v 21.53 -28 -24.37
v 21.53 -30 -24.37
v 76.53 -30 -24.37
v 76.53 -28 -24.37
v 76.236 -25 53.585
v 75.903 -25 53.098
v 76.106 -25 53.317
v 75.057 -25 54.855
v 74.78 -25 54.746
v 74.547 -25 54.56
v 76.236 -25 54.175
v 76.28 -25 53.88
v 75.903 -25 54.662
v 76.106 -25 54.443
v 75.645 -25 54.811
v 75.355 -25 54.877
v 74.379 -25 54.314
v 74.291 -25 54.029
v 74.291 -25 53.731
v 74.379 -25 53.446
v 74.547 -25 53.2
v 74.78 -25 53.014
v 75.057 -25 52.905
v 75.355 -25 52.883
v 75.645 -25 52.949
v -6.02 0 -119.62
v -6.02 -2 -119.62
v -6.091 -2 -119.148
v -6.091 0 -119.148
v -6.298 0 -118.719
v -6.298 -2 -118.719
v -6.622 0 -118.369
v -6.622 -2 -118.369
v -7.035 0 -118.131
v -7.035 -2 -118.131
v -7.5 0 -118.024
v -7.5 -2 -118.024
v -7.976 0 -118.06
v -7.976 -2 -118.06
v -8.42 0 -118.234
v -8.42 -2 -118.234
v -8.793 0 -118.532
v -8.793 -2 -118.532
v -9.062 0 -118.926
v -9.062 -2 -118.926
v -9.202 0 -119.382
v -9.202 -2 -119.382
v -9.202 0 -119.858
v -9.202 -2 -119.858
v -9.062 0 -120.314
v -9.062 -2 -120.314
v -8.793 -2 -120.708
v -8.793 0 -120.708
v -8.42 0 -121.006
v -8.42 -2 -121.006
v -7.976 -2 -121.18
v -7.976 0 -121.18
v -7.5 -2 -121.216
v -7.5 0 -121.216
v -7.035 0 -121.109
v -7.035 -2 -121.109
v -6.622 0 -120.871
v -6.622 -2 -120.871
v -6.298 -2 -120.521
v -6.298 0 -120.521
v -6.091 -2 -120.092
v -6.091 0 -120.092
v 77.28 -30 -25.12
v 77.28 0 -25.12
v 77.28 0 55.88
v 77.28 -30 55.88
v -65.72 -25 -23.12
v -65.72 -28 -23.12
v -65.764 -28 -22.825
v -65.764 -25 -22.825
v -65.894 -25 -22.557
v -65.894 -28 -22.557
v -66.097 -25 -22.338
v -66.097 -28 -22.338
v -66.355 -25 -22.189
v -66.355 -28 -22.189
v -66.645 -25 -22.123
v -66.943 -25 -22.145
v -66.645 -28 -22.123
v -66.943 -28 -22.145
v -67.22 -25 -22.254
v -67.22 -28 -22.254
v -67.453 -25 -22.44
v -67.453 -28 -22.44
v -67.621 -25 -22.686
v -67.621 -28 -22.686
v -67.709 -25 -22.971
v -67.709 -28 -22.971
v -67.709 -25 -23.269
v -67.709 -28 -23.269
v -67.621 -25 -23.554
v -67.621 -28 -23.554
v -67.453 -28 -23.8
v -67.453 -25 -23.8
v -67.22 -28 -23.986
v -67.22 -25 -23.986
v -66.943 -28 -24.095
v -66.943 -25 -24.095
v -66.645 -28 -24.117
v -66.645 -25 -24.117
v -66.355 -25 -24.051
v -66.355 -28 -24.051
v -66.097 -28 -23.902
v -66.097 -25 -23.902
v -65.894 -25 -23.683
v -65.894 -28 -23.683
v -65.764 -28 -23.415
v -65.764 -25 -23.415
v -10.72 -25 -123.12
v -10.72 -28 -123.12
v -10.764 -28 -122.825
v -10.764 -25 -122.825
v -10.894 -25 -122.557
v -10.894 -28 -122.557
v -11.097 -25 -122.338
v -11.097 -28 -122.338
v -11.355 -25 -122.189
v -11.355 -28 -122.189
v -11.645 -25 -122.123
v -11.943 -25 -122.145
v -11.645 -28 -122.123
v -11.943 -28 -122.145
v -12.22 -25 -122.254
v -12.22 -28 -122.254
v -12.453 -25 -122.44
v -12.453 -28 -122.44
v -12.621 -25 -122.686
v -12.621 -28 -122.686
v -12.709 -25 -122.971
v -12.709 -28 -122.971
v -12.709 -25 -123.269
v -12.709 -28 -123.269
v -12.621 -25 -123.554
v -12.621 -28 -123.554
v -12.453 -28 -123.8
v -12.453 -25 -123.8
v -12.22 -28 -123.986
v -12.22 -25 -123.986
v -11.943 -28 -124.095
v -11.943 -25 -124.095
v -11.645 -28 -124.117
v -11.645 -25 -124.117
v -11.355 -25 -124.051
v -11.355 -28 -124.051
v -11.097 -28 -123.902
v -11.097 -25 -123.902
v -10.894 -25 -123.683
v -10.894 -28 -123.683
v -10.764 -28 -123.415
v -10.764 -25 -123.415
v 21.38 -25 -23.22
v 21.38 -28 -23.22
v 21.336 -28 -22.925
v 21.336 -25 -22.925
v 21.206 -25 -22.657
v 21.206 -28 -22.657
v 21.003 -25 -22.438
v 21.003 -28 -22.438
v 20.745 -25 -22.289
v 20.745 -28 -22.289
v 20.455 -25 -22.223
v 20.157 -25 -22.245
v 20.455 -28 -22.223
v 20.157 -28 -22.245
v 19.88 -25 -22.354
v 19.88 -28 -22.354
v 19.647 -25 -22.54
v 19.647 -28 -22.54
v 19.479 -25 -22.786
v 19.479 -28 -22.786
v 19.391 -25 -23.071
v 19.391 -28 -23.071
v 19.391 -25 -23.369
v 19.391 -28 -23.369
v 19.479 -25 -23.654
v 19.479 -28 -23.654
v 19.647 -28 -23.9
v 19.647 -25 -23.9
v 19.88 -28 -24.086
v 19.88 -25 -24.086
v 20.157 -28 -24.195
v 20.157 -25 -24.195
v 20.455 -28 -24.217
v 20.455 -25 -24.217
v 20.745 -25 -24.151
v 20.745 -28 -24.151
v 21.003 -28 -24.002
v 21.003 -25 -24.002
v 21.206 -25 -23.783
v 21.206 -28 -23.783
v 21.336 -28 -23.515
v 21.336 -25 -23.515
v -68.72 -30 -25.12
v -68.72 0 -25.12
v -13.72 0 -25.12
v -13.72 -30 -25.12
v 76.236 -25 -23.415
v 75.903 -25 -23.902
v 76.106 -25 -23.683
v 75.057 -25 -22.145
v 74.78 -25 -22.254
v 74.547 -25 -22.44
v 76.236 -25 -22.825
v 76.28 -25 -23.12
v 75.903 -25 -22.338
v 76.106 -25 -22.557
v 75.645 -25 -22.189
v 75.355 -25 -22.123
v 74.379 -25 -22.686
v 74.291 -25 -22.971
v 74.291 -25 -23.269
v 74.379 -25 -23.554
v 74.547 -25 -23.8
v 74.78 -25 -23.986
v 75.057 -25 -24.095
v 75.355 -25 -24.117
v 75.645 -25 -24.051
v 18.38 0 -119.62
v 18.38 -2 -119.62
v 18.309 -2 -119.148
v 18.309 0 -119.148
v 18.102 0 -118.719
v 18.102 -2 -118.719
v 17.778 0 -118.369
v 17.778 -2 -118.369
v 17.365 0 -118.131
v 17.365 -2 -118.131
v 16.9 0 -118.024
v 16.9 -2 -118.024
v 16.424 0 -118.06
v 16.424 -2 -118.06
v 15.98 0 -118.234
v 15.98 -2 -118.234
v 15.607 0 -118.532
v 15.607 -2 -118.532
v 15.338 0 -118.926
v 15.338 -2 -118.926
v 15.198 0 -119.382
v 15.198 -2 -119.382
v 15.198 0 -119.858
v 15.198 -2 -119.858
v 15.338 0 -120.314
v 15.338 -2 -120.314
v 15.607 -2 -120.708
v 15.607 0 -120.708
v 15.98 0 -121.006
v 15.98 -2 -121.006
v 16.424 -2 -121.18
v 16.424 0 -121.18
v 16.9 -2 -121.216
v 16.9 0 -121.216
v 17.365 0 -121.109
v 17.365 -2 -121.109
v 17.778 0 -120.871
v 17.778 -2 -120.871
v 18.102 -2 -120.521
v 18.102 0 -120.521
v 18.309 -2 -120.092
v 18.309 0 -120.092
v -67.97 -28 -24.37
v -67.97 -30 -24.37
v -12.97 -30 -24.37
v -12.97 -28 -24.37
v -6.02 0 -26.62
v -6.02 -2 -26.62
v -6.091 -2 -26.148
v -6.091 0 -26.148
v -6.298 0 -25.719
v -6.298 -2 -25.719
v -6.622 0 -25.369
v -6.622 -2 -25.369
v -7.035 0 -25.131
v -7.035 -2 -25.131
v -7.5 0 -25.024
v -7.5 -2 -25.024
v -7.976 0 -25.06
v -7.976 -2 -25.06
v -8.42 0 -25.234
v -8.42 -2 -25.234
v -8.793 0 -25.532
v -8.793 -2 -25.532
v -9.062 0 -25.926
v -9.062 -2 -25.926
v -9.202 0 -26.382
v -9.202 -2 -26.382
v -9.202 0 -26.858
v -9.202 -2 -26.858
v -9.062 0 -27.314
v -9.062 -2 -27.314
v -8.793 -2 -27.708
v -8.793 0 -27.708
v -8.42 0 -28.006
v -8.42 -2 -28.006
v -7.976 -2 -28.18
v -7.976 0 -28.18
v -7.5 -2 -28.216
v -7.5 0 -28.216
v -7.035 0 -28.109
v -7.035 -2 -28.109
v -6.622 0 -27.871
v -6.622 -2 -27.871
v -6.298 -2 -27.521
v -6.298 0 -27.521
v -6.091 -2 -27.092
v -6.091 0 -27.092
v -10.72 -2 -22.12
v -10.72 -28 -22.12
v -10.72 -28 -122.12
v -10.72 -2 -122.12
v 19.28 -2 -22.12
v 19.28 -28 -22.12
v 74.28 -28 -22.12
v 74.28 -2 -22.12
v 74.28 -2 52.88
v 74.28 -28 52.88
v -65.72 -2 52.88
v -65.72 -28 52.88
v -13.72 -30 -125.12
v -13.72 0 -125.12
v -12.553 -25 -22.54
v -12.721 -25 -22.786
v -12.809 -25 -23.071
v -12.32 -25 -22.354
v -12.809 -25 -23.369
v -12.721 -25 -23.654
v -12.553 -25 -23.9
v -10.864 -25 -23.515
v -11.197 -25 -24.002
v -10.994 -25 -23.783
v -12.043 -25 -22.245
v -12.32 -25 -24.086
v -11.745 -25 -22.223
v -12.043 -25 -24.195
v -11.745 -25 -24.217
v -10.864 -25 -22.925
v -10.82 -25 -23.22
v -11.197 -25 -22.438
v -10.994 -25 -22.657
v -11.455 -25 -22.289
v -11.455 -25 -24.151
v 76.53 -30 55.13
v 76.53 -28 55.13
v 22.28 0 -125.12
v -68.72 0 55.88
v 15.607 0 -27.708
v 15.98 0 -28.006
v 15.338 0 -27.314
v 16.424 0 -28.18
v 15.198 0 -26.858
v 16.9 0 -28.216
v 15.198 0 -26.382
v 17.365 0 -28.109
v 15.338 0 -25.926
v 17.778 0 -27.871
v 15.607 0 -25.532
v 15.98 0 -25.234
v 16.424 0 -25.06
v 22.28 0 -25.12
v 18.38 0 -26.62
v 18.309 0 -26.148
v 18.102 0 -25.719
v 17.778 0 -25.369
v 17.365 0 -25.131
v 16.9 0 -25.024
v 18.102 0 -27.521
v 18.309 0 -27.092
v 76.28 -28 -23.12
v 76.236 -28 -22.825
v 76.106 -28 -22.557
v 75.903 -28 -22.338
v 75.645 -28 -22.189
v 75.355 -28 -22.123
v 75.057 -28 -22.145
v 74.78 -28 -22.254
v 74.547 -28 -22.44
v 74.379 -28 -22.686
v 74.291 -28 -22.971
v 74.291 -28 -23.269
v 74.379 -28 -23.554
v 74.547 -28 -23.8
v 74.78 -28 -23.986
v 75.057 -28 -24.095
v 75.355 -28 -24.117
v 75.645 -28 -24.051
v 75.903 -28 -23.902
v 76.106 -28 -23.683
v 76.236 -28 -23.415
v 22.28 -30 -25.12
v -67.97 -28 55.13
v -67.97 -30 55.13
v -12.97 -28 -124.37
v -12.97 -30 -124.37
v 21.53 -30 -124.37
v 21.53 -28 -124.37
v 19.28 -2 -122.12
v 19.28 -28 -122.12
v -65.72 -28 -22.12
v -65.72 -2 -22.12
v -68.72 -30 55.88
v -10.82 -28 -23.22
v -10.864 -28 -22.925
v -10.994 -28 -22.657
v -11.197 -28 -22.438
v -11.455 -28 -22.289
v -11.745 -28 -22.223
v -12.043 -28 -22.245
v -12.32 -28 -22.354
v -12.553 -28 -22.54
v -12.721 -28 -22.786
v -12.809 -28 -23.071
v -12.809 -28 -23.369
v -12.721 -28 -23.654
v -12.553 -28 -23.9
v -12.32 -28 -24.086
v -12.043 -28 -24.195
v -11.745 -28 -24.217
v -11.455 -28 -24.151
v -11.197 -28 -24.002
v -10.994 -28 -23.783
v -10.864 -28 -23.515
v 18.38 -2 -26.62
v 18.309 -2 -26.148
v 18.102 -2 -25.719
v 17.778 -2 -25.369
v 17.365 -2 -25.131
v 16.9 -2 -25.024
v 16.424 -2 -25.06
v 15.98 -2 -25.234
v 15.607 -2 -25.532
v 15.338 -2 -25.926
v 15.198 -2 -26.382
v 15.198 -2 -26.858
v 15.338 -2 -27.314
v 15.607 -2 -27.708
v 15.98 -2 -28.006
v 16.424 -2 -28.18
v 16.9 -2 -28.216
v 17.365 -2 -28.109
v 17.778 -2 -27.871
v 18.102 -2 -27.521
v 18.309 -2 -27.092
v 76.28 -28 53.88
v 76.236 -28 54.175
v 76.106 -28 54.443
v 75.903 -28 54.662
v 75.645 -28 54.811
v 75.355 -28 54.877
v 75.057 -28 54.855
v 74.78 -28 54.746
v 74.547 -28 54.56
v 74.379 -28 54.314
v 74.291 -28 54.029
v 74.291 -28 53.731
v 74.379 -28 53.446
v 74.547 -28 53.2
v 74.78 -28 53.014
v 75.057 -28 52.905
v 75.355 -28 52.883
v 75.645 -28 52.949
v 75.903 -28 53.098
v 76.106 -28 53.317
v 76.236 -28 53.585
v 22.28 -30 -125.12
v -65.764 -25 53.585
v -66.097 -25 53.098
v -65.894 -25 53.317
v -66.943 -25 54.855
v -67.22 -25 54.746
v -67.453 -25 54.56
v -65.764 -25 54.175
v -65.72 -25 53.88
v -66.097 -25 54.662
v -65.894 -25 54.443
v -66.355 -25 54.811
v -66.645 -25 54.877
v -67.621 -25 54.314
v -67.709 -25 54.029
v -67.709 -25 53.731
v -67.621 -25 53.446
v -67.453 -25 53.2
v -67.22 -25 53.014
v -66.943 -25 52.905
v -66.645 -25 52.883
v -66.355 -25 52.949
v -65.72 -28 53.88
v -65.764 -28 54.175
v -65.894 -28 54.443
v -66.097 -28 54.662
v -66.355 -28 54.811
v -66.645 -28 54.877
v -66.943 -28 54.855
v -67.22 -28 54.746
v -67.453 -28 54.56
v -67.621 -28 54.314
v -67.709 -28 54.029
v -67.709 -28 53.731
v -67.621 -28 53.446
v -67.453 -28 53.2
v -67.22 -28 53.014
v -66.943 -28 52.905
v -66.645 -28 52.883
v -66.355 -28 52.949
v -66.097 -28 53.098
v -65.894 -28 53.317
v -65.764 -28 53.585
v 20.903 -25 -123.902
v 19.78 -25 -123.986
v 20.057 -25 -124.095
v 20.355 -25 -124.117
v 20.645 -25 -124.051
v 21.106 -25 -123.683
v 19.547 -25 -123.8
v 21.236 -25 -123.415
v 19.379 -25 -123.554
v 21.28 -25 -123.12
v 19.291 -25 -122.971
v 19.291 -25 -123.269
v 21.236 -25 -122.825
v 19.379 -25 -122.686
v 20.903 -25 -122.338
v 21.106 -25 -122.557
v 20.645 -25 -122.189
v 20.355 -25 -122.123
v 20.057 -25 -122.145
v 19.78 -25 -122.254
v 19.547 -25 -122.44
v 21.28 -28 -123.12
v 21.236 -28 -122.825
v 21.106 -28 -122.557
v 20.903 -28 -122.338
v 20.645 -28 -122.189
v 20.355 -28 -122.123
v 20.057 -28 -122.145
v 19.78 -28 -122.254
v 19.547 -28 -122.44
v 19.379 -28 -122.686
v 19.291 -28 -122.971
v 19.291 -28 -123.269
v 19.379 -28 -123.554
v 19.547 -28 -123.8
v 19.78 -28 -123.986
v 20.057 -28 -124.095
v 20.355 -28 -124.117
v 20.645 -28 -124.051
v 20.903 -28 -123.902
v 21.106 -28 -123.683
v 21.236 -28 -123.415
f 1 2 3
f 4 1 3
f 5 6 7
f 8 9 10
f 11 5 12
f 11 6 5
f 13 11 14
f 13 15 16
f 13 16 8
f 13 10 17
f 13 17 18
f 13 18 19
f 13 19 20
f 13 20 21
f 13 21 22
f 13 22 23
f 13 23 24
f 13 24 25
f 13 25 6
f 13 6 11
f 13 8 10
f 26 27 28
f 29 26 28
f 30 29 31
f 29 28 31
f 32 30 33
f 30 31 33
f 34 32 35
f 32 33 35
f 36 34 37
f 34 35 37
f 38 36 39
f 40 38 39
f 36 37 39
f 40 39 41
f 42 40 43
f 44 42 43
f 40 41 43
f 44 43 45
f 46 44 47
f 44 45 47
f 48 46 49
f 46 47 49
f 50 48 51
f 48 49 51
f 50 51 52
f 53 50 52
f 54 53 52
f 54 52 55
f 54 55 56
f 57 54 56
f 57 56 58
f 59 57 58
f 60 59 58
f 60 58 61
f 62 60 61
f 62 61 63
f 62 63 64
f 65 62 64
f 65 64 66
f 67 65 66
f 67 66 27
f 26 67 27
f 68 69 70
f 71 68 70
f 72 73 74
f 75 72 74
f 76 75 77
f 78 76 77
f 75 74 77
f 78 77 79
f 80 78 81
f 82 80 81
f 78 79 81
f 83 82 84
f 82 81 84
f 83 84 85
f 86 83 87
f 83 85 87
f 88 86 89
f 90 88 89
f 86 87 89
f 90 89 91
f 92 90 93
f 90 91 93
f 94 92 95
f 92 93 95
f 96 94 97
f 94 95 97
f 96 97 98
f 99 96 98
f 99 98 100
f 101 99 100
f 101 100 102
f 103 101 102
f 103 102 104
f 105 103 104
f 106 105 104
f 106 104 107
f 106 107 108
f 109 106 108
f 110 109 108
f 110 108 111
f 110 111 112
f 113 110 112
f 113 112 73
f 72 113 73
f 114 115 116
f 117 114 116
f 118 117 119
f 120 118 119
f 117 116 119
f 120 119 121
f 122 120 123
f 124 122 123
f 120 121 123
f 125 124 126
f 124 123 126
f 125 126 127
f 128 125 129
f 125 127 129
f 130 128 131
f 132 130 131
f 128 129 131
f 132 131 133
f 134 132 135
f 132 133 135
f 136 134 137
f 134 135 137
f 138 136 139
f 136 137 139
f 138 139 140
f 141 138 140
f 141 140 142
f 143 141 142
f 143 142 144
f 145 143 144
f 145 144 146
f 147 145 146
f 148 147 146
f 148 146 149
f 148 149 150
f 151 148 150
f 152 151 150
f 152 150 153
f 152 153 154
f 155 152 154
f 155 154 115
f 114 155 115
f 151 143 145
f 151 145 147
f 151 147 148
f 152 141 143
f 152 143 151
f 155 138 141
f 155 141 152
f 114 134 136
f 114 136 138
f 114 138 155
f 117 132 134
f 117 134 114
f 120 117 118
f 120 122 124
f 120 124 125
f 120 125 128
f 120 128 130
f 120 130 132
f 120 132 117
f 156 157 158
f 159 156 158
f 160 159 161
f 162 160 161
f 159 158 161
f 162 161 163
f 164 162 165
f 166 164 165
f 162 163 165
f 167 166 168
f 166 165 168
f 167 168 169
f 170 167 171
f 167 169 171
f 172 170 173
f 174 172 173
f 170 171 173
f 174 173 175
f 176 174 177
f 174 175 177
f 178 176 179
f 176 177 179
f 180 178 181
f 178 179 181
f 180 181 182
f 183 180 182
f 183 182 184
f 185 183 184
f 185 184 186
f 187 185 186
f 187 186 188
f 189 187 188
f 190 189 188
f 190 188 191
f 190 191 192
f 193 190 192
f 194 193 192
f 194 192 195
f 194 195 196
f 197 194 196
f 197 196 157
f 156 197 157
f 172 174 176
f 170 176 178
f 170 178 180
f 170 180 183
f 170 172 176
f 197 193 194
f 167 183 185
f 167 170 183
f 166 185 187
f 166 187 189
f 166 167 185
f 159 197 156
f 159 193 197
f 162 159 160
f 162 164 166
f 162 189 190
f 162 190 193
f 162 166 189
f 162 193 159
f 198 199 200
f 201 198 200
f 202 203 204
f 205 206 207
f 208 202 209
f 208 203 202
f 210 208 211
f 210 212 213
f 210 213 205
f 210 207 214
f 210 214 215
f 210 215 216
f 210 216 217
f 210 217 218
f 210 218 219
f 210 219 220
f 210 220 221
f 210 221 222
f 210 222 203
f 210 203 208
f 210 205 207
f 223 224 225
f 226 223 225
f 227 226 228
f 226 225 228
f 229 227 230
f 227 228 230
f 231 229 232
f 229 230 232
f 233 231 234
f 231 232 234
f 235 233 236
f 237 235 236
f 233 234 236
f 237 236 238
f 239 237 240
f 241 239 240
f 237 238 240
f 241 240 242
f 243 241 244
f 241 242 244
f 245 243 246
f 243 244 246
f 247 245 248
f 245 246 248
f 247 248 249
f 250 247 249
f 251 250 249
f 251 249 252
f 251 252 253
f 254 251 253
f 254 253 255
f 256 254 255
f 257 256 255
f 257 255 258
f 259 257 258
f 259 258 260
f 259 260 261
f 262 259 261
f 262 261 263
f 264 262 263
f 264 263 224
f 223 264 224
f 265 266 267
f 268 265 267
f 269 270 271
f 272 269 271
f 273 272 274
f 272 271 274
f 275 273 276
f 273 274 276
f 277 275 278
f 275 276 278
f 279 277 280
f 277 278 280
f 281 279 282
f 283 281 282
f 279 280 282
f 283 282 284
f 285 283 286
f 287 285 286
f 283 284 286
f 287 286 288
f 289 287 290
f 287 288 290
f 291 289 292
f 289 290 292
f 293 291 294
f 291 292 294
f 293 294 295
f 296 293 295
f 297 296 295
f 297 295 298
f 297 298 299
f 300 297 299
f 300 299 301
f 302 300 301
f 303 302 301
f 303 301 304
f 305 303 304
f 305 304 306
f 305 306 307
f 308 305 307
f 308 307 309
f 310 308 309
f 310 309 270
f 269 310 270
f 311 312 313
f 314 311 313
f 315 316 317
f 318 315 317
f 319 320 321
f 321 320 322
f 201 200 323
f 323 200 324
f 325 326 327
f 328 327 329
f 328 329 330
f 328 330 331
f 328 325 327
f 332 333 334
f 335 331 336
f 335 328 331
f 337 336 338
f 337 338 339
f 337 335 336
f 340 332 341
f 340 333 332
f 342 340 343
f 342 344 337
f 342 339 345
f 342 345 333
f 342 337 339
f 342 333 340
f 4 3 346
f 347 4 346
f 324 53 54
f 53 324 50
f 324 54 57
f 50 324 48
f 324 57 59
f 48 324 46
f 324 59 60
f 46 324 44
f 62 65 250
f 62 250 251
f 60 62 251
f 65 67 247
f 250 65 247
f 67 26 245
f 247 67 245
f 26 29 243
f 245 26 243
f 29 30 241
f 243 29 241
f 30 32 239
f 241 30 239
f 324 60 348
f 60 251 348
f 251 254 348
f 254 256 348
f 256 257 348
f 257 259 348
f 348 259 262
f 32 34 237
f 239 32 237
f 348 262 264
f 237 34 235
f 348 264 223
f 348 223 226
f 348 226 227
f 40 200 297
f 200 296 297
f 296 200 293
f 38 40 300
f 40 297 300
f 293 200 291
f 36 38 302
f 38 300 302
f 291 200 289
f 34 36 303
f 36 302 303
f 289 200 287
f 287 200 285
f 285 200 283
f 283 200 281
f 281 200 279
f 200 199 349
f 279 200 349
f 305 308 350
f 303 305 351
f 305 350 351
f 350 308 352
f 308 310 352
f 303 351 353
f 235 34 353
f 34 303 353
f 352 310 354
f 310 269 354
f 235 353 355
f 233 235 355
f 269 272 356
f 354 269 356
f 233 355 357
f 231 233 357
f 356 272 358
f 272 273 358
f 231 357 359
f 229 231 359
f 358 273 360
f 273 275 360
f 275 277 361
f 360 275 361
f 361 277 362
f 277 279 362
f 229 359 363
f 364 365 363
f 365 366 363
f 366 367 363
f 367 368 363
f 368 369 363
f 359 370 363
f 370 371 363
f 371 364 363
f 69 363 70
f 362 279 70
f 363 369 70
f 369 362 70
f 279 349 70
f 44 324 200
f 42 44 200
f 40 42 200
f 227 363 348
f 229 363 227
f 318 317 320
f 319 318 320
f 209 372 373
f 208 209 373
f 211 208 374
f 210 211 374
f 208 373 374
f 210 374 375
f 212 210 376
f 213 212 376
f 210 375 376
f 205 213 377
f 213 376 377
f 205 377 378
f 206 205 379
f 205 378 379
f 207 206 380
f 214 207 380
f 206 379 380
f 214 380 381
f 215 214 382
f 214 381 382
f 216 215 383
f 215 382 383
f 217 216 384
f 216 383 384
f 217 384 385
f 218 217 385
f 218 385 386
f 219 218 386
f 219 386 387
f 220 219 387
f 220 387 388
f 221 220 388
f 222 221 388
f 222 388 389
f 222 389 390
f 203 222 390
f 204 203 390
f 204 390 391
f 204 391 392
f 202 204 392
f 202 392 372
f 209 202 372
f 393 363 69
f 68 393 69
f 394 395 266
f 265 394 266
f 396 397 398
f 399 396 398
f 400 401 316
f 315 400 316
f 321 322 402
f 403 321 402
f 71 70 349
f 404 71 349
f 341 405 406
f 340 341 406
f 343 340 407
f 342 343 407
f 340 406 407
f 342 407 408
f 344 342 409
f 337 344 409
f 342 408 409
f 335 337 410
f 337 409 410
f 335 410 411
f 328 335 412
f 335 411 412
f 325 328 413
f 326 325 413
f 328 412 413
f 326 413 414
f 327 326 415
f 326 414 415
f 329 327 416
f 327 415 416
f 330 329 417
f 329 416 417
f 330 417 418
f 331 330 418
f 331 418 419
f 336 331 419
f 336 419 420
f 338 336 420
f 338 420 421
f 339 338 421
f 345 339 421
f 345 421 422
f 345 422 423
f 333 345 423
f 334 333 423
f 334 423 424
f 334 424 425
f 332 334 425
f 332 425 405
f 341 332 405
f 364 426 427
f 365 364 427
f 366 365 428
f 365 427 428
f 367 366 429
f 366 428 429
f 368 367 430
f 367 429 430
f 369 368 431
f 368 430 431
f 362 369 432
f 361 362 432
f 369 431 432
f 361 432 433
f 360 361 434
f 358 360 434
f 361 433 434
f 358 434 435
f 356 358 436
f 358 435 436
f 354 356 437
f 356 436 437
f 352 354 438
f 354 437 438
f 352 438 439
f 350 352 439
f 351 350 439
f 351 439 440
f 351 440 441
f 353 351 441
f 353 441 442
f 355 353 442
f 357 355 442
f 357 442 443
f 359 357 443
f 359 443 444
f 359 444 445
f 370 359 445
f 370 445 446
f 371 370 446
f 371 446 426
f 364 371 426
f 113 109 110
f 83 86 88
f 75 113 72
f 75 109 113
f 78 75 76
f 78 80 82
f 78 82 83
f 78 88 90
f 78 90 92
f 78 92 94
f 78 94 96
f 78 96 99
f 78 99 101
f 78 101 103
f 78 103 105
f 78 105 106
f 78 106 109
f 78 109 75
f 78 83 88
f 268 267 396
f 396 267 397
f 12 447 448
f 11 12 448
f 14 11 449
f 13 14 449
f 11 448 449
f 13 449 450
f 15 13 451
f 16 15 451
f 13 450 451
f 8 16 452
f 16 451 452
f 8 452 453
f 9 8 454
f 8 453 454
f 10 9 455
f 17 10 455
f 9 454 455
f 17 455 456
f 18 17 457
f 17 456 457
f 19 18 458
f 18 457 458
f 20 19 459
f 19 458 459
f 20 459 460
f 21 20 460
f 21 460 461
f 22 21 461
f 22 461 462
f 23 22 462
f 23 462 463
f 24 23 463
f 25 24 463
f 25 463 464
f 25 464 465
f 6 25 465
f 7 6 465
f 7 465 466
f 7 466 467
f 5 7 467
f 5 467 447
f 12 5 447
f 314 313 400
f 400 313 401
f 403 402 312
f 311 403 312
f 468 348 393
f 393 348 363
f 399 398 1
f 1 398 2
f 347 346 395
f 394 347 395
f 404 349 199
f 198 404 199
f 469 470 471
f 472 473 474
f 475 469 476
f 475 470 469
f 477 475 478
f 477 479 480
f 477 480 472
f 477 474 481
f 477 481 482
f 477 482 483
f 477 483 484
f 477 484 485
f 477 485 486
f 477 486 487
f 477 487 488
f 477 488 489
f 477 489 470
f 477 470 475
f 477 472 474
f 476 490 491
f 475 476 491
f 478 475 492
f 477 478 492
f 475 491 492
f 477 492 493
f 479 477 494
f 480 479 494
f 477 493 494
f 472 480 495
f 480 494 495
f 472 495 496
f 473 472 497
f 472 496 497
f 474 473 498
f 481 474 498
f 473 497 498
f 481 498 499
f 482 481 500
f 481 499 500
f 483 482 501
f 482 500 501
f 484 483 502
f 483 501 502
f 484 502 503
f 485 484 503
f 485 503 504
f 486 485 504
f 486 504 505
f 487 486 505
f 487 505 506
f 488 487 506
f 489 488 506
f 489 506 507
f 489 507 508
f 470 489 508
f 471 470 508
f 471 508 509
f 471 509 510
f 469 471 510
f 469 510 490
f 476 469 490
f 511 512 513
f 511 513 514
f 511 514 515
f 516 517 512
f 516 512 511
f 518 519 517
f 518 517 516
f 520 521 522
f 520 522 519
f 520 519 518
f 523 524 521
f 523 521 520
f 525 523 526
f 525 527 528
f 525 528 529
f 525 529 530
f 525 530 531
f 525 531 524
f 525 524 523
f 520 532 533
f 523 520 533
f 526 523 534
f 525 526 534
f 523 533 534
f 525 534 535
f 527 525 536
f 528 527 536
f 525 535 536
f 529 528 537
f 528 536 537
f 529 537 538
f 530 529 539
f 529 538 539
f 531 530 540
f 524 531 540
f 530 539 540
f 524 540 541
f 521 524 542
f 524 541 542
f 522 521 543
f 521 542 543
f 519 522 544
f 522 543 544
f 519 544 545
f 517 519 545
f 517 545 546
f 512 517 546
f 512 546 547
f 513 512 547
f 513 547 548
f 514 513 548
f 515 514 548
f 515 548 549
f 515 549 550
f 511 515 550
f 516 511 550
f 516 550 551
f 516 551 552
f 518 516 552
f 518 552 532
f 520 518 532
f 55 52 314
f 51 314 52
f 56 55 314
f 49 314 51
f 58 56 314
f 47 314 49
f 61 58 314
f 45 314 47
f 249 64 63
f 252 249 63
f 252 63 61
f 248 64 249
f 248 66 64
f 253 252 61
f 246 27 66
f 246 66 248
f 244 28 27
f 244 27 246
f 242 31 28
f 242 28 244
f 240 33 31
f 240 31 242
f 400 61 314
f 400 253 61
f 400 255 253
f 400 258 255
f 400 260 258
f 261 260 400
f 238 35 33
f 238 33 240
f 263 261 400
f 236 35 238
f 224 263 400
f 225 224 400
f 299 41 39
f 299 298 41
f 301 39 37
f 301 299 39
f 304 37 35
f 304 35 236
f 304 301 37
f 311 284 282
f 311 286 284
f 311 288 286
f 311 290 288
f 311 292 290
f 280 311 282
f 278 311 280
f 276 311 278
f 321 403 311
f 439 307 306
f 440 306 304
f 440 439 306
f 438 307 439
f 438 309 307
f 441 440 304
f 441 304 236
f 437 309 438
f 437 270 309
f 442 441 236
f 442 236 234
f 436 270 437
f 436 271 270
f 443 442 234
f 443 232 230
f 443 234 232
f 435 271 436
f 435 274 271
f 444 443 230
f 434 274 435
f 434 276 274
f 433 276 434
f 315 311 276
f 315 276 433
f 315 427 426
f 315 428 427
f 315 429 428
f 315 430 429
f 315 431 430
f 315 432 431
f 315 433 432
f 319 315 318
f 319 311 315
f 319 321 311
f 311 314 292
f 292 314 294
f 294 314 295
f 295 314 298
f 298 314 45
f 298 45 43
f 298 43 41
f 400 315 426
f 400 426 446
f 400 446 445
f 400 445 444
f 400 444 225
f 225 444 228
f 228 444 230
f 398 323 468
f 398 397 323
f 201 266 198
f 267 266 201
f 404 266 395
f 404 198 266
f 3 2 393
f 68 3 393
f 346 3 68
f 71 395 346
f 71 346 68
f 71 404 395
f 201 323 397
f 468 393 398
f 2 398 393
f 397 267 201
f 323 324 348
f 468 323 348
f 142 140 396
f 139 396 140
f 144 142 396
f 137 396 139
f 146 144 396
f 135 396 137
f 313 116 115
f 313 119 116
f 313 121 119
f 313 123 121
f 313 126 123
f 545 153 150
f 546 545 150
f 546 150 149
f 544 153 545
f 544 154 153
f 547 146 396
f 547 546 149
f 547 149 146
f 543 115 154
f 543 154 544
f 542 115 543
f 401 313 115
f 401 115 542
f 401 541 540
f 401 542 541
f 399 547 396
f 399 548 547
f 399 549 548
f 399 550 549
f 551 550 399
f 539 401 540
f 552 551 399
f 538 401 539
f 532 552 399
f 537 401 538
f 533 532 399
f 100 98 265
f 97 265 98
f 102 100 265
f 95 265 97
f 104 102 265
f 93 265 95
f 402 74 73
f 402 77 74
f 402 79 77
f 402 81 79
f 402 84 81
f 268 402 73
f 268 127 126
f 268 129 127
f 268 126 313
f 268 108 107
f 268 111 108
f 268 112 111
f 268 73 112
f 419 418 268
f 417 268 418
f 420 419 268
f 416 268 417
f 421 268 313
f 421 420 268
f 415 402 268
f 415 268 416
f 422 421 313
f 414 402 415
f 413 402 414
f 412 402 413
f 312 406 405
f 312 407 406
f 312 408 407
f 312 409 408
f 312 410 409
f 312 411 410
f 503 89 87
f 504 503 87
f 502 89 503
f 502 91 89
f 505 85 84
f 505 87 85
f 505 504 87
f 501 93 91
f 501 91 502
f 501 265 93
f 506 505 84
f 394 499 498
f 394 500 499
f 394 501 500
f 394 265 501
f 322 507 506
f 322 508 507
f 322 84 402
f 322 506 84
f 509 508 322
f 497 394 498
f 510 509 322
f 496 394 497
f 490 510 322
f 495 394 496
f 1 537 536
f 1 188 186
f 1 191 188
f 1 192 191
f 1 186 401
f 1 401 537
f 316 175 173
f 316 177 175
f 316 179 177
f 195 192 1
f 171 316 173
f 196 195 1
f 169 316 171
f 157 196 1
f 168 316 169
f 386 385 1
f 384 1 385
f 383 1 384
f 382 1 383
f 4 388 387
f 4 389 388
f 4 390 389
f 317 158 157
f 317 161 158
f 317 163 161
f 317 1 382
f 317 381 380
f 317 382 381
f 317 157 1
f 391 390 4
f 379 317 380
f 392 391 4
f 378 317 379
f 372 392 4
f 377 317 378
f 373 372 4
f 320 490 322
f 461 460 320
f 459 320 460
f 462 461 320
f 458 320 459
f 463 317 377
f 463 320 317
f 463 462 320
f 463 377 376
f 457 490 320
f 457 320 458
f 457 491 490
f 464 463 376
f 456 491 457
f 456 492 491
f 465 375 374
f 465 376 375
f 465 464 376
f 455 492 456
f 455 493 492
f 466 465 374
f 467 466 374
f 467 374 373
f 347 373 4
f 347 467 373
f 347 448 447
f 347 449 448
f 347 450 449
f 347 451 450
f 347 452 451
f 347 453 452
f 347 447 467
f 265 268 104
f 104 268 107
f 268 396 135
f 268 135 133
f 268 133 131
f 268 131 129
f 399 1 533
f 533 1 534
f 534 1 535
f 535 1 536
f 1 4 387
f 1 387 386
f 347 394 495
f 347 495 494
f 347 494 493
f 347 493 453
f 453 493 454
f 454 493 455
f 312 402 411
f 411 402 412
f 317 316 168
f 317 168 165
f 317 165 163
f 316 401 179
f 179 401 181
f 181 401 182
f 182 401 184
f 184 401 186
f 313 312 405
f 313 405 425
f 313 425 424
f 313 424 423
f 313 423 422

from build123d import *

# Parameters (mm, degrees)
PAD_DEPTH       = 30
POCKET_DEPTH    = 28
SKETCH002_R     = 1
POCKET001_DEPTH = 5
SKETCH003_R     = 1.6
POCKET002_DEPTH = 5
POCKET003_DEPTH = 2


with BuildPart() as part:
    # Sketch → Pad (new body)
    with BuildSketch(Plane.XZ):
        Polygon((-68.72, 55.88), (-68.72, -25.12), (-13.72, -25.12), (-13.72, -125.12), (22.28, -125.12), (22.28, -25.12), (77.28, -25.12), (77.28, 55.88), align=None)
    extrude(amount=PAD_DEPTH)

    # Sketch001 (on Face10 of Pad) → Pocket (cut)
    with BuildSketch(Plane.XZ.offset(30)):
        Polygon((-65.72, 52.88), (-65.72, -22.12), (-10.72, -22.12), (-10.72, -122.12), (19.28, -122.12), (19.28, -22.12), (74.28, -22.12), (74.28, 52.88), align=None)
    extrude(amount=-POCKET_DEPTH, mode=Mode.SUBTRACT)

    # Sketch002 (on Face10 of Pad) → Pocket001 (cut)
    with BuildSketch(Plane.XZ.offset(30)):
        with Locations((-11.82, -23.22)):
            Circle(SKETCH002_R)
        with Locations((-11.72, -123.12)):
            Circle(SKETCH002_R)
        with Locations((20.38, -23.22)):
            Circle(SKETCH002_R)
        with Locations((20.28, -123.12)):
            Circle(SKETCH002_R)
        with Locations((-66.72, -23.12)):
            Circle(SKETCH002_R)
        with Locations((75.28, -23.12)):
            Circle(SKETCH002_R)
        with Locations((75.28, 53.88)):
            Circle(SKETCH002_R)
        with Locations((-66.72, 53.88)):
            Circle(SKETCH002_R)
    extrude(amount=-POCKET001_DEPTH, mode=Mode.SUBTRACT)

    # Sketch003 (on Face28 of Pocket001) → Pocket002 (cut)
    with BuildSketch(Plane.XZ.offset(2)):
        with Locations((-7.62, -119.62)):
            Circle(SKETCH003_R)
        with Locations((16.78, -119.62)):
            Circle(SKETCH003_R)
        with Locations((-7.62, -26.62)):
            Circle(SKETCH003_R)
        with Locations((16.78, -26.62)):
            Circle(SKETCH003_R)
    extrude(amount=-POCKET002_DEPTH, mode=Mode.SUBTRACT)

    # Sketch004 (on Face5 of Pocket002) → Pocket003 (cut)
    with BuildSketch(Plane.XZ.offset(30)):
        Polygon((-67.97, 55.13), (-67.97, -24.37), (-12.97, -24.37), (-12.97, -124.37), (21.53, -124.37), (21.53, -24.37), (76.53, -24.37), (76.53, 55.13), align=None)
    extrude(amount=-POCKET003_DEPTH, mode=Mode.SUBTRACT)


solid = part.part
